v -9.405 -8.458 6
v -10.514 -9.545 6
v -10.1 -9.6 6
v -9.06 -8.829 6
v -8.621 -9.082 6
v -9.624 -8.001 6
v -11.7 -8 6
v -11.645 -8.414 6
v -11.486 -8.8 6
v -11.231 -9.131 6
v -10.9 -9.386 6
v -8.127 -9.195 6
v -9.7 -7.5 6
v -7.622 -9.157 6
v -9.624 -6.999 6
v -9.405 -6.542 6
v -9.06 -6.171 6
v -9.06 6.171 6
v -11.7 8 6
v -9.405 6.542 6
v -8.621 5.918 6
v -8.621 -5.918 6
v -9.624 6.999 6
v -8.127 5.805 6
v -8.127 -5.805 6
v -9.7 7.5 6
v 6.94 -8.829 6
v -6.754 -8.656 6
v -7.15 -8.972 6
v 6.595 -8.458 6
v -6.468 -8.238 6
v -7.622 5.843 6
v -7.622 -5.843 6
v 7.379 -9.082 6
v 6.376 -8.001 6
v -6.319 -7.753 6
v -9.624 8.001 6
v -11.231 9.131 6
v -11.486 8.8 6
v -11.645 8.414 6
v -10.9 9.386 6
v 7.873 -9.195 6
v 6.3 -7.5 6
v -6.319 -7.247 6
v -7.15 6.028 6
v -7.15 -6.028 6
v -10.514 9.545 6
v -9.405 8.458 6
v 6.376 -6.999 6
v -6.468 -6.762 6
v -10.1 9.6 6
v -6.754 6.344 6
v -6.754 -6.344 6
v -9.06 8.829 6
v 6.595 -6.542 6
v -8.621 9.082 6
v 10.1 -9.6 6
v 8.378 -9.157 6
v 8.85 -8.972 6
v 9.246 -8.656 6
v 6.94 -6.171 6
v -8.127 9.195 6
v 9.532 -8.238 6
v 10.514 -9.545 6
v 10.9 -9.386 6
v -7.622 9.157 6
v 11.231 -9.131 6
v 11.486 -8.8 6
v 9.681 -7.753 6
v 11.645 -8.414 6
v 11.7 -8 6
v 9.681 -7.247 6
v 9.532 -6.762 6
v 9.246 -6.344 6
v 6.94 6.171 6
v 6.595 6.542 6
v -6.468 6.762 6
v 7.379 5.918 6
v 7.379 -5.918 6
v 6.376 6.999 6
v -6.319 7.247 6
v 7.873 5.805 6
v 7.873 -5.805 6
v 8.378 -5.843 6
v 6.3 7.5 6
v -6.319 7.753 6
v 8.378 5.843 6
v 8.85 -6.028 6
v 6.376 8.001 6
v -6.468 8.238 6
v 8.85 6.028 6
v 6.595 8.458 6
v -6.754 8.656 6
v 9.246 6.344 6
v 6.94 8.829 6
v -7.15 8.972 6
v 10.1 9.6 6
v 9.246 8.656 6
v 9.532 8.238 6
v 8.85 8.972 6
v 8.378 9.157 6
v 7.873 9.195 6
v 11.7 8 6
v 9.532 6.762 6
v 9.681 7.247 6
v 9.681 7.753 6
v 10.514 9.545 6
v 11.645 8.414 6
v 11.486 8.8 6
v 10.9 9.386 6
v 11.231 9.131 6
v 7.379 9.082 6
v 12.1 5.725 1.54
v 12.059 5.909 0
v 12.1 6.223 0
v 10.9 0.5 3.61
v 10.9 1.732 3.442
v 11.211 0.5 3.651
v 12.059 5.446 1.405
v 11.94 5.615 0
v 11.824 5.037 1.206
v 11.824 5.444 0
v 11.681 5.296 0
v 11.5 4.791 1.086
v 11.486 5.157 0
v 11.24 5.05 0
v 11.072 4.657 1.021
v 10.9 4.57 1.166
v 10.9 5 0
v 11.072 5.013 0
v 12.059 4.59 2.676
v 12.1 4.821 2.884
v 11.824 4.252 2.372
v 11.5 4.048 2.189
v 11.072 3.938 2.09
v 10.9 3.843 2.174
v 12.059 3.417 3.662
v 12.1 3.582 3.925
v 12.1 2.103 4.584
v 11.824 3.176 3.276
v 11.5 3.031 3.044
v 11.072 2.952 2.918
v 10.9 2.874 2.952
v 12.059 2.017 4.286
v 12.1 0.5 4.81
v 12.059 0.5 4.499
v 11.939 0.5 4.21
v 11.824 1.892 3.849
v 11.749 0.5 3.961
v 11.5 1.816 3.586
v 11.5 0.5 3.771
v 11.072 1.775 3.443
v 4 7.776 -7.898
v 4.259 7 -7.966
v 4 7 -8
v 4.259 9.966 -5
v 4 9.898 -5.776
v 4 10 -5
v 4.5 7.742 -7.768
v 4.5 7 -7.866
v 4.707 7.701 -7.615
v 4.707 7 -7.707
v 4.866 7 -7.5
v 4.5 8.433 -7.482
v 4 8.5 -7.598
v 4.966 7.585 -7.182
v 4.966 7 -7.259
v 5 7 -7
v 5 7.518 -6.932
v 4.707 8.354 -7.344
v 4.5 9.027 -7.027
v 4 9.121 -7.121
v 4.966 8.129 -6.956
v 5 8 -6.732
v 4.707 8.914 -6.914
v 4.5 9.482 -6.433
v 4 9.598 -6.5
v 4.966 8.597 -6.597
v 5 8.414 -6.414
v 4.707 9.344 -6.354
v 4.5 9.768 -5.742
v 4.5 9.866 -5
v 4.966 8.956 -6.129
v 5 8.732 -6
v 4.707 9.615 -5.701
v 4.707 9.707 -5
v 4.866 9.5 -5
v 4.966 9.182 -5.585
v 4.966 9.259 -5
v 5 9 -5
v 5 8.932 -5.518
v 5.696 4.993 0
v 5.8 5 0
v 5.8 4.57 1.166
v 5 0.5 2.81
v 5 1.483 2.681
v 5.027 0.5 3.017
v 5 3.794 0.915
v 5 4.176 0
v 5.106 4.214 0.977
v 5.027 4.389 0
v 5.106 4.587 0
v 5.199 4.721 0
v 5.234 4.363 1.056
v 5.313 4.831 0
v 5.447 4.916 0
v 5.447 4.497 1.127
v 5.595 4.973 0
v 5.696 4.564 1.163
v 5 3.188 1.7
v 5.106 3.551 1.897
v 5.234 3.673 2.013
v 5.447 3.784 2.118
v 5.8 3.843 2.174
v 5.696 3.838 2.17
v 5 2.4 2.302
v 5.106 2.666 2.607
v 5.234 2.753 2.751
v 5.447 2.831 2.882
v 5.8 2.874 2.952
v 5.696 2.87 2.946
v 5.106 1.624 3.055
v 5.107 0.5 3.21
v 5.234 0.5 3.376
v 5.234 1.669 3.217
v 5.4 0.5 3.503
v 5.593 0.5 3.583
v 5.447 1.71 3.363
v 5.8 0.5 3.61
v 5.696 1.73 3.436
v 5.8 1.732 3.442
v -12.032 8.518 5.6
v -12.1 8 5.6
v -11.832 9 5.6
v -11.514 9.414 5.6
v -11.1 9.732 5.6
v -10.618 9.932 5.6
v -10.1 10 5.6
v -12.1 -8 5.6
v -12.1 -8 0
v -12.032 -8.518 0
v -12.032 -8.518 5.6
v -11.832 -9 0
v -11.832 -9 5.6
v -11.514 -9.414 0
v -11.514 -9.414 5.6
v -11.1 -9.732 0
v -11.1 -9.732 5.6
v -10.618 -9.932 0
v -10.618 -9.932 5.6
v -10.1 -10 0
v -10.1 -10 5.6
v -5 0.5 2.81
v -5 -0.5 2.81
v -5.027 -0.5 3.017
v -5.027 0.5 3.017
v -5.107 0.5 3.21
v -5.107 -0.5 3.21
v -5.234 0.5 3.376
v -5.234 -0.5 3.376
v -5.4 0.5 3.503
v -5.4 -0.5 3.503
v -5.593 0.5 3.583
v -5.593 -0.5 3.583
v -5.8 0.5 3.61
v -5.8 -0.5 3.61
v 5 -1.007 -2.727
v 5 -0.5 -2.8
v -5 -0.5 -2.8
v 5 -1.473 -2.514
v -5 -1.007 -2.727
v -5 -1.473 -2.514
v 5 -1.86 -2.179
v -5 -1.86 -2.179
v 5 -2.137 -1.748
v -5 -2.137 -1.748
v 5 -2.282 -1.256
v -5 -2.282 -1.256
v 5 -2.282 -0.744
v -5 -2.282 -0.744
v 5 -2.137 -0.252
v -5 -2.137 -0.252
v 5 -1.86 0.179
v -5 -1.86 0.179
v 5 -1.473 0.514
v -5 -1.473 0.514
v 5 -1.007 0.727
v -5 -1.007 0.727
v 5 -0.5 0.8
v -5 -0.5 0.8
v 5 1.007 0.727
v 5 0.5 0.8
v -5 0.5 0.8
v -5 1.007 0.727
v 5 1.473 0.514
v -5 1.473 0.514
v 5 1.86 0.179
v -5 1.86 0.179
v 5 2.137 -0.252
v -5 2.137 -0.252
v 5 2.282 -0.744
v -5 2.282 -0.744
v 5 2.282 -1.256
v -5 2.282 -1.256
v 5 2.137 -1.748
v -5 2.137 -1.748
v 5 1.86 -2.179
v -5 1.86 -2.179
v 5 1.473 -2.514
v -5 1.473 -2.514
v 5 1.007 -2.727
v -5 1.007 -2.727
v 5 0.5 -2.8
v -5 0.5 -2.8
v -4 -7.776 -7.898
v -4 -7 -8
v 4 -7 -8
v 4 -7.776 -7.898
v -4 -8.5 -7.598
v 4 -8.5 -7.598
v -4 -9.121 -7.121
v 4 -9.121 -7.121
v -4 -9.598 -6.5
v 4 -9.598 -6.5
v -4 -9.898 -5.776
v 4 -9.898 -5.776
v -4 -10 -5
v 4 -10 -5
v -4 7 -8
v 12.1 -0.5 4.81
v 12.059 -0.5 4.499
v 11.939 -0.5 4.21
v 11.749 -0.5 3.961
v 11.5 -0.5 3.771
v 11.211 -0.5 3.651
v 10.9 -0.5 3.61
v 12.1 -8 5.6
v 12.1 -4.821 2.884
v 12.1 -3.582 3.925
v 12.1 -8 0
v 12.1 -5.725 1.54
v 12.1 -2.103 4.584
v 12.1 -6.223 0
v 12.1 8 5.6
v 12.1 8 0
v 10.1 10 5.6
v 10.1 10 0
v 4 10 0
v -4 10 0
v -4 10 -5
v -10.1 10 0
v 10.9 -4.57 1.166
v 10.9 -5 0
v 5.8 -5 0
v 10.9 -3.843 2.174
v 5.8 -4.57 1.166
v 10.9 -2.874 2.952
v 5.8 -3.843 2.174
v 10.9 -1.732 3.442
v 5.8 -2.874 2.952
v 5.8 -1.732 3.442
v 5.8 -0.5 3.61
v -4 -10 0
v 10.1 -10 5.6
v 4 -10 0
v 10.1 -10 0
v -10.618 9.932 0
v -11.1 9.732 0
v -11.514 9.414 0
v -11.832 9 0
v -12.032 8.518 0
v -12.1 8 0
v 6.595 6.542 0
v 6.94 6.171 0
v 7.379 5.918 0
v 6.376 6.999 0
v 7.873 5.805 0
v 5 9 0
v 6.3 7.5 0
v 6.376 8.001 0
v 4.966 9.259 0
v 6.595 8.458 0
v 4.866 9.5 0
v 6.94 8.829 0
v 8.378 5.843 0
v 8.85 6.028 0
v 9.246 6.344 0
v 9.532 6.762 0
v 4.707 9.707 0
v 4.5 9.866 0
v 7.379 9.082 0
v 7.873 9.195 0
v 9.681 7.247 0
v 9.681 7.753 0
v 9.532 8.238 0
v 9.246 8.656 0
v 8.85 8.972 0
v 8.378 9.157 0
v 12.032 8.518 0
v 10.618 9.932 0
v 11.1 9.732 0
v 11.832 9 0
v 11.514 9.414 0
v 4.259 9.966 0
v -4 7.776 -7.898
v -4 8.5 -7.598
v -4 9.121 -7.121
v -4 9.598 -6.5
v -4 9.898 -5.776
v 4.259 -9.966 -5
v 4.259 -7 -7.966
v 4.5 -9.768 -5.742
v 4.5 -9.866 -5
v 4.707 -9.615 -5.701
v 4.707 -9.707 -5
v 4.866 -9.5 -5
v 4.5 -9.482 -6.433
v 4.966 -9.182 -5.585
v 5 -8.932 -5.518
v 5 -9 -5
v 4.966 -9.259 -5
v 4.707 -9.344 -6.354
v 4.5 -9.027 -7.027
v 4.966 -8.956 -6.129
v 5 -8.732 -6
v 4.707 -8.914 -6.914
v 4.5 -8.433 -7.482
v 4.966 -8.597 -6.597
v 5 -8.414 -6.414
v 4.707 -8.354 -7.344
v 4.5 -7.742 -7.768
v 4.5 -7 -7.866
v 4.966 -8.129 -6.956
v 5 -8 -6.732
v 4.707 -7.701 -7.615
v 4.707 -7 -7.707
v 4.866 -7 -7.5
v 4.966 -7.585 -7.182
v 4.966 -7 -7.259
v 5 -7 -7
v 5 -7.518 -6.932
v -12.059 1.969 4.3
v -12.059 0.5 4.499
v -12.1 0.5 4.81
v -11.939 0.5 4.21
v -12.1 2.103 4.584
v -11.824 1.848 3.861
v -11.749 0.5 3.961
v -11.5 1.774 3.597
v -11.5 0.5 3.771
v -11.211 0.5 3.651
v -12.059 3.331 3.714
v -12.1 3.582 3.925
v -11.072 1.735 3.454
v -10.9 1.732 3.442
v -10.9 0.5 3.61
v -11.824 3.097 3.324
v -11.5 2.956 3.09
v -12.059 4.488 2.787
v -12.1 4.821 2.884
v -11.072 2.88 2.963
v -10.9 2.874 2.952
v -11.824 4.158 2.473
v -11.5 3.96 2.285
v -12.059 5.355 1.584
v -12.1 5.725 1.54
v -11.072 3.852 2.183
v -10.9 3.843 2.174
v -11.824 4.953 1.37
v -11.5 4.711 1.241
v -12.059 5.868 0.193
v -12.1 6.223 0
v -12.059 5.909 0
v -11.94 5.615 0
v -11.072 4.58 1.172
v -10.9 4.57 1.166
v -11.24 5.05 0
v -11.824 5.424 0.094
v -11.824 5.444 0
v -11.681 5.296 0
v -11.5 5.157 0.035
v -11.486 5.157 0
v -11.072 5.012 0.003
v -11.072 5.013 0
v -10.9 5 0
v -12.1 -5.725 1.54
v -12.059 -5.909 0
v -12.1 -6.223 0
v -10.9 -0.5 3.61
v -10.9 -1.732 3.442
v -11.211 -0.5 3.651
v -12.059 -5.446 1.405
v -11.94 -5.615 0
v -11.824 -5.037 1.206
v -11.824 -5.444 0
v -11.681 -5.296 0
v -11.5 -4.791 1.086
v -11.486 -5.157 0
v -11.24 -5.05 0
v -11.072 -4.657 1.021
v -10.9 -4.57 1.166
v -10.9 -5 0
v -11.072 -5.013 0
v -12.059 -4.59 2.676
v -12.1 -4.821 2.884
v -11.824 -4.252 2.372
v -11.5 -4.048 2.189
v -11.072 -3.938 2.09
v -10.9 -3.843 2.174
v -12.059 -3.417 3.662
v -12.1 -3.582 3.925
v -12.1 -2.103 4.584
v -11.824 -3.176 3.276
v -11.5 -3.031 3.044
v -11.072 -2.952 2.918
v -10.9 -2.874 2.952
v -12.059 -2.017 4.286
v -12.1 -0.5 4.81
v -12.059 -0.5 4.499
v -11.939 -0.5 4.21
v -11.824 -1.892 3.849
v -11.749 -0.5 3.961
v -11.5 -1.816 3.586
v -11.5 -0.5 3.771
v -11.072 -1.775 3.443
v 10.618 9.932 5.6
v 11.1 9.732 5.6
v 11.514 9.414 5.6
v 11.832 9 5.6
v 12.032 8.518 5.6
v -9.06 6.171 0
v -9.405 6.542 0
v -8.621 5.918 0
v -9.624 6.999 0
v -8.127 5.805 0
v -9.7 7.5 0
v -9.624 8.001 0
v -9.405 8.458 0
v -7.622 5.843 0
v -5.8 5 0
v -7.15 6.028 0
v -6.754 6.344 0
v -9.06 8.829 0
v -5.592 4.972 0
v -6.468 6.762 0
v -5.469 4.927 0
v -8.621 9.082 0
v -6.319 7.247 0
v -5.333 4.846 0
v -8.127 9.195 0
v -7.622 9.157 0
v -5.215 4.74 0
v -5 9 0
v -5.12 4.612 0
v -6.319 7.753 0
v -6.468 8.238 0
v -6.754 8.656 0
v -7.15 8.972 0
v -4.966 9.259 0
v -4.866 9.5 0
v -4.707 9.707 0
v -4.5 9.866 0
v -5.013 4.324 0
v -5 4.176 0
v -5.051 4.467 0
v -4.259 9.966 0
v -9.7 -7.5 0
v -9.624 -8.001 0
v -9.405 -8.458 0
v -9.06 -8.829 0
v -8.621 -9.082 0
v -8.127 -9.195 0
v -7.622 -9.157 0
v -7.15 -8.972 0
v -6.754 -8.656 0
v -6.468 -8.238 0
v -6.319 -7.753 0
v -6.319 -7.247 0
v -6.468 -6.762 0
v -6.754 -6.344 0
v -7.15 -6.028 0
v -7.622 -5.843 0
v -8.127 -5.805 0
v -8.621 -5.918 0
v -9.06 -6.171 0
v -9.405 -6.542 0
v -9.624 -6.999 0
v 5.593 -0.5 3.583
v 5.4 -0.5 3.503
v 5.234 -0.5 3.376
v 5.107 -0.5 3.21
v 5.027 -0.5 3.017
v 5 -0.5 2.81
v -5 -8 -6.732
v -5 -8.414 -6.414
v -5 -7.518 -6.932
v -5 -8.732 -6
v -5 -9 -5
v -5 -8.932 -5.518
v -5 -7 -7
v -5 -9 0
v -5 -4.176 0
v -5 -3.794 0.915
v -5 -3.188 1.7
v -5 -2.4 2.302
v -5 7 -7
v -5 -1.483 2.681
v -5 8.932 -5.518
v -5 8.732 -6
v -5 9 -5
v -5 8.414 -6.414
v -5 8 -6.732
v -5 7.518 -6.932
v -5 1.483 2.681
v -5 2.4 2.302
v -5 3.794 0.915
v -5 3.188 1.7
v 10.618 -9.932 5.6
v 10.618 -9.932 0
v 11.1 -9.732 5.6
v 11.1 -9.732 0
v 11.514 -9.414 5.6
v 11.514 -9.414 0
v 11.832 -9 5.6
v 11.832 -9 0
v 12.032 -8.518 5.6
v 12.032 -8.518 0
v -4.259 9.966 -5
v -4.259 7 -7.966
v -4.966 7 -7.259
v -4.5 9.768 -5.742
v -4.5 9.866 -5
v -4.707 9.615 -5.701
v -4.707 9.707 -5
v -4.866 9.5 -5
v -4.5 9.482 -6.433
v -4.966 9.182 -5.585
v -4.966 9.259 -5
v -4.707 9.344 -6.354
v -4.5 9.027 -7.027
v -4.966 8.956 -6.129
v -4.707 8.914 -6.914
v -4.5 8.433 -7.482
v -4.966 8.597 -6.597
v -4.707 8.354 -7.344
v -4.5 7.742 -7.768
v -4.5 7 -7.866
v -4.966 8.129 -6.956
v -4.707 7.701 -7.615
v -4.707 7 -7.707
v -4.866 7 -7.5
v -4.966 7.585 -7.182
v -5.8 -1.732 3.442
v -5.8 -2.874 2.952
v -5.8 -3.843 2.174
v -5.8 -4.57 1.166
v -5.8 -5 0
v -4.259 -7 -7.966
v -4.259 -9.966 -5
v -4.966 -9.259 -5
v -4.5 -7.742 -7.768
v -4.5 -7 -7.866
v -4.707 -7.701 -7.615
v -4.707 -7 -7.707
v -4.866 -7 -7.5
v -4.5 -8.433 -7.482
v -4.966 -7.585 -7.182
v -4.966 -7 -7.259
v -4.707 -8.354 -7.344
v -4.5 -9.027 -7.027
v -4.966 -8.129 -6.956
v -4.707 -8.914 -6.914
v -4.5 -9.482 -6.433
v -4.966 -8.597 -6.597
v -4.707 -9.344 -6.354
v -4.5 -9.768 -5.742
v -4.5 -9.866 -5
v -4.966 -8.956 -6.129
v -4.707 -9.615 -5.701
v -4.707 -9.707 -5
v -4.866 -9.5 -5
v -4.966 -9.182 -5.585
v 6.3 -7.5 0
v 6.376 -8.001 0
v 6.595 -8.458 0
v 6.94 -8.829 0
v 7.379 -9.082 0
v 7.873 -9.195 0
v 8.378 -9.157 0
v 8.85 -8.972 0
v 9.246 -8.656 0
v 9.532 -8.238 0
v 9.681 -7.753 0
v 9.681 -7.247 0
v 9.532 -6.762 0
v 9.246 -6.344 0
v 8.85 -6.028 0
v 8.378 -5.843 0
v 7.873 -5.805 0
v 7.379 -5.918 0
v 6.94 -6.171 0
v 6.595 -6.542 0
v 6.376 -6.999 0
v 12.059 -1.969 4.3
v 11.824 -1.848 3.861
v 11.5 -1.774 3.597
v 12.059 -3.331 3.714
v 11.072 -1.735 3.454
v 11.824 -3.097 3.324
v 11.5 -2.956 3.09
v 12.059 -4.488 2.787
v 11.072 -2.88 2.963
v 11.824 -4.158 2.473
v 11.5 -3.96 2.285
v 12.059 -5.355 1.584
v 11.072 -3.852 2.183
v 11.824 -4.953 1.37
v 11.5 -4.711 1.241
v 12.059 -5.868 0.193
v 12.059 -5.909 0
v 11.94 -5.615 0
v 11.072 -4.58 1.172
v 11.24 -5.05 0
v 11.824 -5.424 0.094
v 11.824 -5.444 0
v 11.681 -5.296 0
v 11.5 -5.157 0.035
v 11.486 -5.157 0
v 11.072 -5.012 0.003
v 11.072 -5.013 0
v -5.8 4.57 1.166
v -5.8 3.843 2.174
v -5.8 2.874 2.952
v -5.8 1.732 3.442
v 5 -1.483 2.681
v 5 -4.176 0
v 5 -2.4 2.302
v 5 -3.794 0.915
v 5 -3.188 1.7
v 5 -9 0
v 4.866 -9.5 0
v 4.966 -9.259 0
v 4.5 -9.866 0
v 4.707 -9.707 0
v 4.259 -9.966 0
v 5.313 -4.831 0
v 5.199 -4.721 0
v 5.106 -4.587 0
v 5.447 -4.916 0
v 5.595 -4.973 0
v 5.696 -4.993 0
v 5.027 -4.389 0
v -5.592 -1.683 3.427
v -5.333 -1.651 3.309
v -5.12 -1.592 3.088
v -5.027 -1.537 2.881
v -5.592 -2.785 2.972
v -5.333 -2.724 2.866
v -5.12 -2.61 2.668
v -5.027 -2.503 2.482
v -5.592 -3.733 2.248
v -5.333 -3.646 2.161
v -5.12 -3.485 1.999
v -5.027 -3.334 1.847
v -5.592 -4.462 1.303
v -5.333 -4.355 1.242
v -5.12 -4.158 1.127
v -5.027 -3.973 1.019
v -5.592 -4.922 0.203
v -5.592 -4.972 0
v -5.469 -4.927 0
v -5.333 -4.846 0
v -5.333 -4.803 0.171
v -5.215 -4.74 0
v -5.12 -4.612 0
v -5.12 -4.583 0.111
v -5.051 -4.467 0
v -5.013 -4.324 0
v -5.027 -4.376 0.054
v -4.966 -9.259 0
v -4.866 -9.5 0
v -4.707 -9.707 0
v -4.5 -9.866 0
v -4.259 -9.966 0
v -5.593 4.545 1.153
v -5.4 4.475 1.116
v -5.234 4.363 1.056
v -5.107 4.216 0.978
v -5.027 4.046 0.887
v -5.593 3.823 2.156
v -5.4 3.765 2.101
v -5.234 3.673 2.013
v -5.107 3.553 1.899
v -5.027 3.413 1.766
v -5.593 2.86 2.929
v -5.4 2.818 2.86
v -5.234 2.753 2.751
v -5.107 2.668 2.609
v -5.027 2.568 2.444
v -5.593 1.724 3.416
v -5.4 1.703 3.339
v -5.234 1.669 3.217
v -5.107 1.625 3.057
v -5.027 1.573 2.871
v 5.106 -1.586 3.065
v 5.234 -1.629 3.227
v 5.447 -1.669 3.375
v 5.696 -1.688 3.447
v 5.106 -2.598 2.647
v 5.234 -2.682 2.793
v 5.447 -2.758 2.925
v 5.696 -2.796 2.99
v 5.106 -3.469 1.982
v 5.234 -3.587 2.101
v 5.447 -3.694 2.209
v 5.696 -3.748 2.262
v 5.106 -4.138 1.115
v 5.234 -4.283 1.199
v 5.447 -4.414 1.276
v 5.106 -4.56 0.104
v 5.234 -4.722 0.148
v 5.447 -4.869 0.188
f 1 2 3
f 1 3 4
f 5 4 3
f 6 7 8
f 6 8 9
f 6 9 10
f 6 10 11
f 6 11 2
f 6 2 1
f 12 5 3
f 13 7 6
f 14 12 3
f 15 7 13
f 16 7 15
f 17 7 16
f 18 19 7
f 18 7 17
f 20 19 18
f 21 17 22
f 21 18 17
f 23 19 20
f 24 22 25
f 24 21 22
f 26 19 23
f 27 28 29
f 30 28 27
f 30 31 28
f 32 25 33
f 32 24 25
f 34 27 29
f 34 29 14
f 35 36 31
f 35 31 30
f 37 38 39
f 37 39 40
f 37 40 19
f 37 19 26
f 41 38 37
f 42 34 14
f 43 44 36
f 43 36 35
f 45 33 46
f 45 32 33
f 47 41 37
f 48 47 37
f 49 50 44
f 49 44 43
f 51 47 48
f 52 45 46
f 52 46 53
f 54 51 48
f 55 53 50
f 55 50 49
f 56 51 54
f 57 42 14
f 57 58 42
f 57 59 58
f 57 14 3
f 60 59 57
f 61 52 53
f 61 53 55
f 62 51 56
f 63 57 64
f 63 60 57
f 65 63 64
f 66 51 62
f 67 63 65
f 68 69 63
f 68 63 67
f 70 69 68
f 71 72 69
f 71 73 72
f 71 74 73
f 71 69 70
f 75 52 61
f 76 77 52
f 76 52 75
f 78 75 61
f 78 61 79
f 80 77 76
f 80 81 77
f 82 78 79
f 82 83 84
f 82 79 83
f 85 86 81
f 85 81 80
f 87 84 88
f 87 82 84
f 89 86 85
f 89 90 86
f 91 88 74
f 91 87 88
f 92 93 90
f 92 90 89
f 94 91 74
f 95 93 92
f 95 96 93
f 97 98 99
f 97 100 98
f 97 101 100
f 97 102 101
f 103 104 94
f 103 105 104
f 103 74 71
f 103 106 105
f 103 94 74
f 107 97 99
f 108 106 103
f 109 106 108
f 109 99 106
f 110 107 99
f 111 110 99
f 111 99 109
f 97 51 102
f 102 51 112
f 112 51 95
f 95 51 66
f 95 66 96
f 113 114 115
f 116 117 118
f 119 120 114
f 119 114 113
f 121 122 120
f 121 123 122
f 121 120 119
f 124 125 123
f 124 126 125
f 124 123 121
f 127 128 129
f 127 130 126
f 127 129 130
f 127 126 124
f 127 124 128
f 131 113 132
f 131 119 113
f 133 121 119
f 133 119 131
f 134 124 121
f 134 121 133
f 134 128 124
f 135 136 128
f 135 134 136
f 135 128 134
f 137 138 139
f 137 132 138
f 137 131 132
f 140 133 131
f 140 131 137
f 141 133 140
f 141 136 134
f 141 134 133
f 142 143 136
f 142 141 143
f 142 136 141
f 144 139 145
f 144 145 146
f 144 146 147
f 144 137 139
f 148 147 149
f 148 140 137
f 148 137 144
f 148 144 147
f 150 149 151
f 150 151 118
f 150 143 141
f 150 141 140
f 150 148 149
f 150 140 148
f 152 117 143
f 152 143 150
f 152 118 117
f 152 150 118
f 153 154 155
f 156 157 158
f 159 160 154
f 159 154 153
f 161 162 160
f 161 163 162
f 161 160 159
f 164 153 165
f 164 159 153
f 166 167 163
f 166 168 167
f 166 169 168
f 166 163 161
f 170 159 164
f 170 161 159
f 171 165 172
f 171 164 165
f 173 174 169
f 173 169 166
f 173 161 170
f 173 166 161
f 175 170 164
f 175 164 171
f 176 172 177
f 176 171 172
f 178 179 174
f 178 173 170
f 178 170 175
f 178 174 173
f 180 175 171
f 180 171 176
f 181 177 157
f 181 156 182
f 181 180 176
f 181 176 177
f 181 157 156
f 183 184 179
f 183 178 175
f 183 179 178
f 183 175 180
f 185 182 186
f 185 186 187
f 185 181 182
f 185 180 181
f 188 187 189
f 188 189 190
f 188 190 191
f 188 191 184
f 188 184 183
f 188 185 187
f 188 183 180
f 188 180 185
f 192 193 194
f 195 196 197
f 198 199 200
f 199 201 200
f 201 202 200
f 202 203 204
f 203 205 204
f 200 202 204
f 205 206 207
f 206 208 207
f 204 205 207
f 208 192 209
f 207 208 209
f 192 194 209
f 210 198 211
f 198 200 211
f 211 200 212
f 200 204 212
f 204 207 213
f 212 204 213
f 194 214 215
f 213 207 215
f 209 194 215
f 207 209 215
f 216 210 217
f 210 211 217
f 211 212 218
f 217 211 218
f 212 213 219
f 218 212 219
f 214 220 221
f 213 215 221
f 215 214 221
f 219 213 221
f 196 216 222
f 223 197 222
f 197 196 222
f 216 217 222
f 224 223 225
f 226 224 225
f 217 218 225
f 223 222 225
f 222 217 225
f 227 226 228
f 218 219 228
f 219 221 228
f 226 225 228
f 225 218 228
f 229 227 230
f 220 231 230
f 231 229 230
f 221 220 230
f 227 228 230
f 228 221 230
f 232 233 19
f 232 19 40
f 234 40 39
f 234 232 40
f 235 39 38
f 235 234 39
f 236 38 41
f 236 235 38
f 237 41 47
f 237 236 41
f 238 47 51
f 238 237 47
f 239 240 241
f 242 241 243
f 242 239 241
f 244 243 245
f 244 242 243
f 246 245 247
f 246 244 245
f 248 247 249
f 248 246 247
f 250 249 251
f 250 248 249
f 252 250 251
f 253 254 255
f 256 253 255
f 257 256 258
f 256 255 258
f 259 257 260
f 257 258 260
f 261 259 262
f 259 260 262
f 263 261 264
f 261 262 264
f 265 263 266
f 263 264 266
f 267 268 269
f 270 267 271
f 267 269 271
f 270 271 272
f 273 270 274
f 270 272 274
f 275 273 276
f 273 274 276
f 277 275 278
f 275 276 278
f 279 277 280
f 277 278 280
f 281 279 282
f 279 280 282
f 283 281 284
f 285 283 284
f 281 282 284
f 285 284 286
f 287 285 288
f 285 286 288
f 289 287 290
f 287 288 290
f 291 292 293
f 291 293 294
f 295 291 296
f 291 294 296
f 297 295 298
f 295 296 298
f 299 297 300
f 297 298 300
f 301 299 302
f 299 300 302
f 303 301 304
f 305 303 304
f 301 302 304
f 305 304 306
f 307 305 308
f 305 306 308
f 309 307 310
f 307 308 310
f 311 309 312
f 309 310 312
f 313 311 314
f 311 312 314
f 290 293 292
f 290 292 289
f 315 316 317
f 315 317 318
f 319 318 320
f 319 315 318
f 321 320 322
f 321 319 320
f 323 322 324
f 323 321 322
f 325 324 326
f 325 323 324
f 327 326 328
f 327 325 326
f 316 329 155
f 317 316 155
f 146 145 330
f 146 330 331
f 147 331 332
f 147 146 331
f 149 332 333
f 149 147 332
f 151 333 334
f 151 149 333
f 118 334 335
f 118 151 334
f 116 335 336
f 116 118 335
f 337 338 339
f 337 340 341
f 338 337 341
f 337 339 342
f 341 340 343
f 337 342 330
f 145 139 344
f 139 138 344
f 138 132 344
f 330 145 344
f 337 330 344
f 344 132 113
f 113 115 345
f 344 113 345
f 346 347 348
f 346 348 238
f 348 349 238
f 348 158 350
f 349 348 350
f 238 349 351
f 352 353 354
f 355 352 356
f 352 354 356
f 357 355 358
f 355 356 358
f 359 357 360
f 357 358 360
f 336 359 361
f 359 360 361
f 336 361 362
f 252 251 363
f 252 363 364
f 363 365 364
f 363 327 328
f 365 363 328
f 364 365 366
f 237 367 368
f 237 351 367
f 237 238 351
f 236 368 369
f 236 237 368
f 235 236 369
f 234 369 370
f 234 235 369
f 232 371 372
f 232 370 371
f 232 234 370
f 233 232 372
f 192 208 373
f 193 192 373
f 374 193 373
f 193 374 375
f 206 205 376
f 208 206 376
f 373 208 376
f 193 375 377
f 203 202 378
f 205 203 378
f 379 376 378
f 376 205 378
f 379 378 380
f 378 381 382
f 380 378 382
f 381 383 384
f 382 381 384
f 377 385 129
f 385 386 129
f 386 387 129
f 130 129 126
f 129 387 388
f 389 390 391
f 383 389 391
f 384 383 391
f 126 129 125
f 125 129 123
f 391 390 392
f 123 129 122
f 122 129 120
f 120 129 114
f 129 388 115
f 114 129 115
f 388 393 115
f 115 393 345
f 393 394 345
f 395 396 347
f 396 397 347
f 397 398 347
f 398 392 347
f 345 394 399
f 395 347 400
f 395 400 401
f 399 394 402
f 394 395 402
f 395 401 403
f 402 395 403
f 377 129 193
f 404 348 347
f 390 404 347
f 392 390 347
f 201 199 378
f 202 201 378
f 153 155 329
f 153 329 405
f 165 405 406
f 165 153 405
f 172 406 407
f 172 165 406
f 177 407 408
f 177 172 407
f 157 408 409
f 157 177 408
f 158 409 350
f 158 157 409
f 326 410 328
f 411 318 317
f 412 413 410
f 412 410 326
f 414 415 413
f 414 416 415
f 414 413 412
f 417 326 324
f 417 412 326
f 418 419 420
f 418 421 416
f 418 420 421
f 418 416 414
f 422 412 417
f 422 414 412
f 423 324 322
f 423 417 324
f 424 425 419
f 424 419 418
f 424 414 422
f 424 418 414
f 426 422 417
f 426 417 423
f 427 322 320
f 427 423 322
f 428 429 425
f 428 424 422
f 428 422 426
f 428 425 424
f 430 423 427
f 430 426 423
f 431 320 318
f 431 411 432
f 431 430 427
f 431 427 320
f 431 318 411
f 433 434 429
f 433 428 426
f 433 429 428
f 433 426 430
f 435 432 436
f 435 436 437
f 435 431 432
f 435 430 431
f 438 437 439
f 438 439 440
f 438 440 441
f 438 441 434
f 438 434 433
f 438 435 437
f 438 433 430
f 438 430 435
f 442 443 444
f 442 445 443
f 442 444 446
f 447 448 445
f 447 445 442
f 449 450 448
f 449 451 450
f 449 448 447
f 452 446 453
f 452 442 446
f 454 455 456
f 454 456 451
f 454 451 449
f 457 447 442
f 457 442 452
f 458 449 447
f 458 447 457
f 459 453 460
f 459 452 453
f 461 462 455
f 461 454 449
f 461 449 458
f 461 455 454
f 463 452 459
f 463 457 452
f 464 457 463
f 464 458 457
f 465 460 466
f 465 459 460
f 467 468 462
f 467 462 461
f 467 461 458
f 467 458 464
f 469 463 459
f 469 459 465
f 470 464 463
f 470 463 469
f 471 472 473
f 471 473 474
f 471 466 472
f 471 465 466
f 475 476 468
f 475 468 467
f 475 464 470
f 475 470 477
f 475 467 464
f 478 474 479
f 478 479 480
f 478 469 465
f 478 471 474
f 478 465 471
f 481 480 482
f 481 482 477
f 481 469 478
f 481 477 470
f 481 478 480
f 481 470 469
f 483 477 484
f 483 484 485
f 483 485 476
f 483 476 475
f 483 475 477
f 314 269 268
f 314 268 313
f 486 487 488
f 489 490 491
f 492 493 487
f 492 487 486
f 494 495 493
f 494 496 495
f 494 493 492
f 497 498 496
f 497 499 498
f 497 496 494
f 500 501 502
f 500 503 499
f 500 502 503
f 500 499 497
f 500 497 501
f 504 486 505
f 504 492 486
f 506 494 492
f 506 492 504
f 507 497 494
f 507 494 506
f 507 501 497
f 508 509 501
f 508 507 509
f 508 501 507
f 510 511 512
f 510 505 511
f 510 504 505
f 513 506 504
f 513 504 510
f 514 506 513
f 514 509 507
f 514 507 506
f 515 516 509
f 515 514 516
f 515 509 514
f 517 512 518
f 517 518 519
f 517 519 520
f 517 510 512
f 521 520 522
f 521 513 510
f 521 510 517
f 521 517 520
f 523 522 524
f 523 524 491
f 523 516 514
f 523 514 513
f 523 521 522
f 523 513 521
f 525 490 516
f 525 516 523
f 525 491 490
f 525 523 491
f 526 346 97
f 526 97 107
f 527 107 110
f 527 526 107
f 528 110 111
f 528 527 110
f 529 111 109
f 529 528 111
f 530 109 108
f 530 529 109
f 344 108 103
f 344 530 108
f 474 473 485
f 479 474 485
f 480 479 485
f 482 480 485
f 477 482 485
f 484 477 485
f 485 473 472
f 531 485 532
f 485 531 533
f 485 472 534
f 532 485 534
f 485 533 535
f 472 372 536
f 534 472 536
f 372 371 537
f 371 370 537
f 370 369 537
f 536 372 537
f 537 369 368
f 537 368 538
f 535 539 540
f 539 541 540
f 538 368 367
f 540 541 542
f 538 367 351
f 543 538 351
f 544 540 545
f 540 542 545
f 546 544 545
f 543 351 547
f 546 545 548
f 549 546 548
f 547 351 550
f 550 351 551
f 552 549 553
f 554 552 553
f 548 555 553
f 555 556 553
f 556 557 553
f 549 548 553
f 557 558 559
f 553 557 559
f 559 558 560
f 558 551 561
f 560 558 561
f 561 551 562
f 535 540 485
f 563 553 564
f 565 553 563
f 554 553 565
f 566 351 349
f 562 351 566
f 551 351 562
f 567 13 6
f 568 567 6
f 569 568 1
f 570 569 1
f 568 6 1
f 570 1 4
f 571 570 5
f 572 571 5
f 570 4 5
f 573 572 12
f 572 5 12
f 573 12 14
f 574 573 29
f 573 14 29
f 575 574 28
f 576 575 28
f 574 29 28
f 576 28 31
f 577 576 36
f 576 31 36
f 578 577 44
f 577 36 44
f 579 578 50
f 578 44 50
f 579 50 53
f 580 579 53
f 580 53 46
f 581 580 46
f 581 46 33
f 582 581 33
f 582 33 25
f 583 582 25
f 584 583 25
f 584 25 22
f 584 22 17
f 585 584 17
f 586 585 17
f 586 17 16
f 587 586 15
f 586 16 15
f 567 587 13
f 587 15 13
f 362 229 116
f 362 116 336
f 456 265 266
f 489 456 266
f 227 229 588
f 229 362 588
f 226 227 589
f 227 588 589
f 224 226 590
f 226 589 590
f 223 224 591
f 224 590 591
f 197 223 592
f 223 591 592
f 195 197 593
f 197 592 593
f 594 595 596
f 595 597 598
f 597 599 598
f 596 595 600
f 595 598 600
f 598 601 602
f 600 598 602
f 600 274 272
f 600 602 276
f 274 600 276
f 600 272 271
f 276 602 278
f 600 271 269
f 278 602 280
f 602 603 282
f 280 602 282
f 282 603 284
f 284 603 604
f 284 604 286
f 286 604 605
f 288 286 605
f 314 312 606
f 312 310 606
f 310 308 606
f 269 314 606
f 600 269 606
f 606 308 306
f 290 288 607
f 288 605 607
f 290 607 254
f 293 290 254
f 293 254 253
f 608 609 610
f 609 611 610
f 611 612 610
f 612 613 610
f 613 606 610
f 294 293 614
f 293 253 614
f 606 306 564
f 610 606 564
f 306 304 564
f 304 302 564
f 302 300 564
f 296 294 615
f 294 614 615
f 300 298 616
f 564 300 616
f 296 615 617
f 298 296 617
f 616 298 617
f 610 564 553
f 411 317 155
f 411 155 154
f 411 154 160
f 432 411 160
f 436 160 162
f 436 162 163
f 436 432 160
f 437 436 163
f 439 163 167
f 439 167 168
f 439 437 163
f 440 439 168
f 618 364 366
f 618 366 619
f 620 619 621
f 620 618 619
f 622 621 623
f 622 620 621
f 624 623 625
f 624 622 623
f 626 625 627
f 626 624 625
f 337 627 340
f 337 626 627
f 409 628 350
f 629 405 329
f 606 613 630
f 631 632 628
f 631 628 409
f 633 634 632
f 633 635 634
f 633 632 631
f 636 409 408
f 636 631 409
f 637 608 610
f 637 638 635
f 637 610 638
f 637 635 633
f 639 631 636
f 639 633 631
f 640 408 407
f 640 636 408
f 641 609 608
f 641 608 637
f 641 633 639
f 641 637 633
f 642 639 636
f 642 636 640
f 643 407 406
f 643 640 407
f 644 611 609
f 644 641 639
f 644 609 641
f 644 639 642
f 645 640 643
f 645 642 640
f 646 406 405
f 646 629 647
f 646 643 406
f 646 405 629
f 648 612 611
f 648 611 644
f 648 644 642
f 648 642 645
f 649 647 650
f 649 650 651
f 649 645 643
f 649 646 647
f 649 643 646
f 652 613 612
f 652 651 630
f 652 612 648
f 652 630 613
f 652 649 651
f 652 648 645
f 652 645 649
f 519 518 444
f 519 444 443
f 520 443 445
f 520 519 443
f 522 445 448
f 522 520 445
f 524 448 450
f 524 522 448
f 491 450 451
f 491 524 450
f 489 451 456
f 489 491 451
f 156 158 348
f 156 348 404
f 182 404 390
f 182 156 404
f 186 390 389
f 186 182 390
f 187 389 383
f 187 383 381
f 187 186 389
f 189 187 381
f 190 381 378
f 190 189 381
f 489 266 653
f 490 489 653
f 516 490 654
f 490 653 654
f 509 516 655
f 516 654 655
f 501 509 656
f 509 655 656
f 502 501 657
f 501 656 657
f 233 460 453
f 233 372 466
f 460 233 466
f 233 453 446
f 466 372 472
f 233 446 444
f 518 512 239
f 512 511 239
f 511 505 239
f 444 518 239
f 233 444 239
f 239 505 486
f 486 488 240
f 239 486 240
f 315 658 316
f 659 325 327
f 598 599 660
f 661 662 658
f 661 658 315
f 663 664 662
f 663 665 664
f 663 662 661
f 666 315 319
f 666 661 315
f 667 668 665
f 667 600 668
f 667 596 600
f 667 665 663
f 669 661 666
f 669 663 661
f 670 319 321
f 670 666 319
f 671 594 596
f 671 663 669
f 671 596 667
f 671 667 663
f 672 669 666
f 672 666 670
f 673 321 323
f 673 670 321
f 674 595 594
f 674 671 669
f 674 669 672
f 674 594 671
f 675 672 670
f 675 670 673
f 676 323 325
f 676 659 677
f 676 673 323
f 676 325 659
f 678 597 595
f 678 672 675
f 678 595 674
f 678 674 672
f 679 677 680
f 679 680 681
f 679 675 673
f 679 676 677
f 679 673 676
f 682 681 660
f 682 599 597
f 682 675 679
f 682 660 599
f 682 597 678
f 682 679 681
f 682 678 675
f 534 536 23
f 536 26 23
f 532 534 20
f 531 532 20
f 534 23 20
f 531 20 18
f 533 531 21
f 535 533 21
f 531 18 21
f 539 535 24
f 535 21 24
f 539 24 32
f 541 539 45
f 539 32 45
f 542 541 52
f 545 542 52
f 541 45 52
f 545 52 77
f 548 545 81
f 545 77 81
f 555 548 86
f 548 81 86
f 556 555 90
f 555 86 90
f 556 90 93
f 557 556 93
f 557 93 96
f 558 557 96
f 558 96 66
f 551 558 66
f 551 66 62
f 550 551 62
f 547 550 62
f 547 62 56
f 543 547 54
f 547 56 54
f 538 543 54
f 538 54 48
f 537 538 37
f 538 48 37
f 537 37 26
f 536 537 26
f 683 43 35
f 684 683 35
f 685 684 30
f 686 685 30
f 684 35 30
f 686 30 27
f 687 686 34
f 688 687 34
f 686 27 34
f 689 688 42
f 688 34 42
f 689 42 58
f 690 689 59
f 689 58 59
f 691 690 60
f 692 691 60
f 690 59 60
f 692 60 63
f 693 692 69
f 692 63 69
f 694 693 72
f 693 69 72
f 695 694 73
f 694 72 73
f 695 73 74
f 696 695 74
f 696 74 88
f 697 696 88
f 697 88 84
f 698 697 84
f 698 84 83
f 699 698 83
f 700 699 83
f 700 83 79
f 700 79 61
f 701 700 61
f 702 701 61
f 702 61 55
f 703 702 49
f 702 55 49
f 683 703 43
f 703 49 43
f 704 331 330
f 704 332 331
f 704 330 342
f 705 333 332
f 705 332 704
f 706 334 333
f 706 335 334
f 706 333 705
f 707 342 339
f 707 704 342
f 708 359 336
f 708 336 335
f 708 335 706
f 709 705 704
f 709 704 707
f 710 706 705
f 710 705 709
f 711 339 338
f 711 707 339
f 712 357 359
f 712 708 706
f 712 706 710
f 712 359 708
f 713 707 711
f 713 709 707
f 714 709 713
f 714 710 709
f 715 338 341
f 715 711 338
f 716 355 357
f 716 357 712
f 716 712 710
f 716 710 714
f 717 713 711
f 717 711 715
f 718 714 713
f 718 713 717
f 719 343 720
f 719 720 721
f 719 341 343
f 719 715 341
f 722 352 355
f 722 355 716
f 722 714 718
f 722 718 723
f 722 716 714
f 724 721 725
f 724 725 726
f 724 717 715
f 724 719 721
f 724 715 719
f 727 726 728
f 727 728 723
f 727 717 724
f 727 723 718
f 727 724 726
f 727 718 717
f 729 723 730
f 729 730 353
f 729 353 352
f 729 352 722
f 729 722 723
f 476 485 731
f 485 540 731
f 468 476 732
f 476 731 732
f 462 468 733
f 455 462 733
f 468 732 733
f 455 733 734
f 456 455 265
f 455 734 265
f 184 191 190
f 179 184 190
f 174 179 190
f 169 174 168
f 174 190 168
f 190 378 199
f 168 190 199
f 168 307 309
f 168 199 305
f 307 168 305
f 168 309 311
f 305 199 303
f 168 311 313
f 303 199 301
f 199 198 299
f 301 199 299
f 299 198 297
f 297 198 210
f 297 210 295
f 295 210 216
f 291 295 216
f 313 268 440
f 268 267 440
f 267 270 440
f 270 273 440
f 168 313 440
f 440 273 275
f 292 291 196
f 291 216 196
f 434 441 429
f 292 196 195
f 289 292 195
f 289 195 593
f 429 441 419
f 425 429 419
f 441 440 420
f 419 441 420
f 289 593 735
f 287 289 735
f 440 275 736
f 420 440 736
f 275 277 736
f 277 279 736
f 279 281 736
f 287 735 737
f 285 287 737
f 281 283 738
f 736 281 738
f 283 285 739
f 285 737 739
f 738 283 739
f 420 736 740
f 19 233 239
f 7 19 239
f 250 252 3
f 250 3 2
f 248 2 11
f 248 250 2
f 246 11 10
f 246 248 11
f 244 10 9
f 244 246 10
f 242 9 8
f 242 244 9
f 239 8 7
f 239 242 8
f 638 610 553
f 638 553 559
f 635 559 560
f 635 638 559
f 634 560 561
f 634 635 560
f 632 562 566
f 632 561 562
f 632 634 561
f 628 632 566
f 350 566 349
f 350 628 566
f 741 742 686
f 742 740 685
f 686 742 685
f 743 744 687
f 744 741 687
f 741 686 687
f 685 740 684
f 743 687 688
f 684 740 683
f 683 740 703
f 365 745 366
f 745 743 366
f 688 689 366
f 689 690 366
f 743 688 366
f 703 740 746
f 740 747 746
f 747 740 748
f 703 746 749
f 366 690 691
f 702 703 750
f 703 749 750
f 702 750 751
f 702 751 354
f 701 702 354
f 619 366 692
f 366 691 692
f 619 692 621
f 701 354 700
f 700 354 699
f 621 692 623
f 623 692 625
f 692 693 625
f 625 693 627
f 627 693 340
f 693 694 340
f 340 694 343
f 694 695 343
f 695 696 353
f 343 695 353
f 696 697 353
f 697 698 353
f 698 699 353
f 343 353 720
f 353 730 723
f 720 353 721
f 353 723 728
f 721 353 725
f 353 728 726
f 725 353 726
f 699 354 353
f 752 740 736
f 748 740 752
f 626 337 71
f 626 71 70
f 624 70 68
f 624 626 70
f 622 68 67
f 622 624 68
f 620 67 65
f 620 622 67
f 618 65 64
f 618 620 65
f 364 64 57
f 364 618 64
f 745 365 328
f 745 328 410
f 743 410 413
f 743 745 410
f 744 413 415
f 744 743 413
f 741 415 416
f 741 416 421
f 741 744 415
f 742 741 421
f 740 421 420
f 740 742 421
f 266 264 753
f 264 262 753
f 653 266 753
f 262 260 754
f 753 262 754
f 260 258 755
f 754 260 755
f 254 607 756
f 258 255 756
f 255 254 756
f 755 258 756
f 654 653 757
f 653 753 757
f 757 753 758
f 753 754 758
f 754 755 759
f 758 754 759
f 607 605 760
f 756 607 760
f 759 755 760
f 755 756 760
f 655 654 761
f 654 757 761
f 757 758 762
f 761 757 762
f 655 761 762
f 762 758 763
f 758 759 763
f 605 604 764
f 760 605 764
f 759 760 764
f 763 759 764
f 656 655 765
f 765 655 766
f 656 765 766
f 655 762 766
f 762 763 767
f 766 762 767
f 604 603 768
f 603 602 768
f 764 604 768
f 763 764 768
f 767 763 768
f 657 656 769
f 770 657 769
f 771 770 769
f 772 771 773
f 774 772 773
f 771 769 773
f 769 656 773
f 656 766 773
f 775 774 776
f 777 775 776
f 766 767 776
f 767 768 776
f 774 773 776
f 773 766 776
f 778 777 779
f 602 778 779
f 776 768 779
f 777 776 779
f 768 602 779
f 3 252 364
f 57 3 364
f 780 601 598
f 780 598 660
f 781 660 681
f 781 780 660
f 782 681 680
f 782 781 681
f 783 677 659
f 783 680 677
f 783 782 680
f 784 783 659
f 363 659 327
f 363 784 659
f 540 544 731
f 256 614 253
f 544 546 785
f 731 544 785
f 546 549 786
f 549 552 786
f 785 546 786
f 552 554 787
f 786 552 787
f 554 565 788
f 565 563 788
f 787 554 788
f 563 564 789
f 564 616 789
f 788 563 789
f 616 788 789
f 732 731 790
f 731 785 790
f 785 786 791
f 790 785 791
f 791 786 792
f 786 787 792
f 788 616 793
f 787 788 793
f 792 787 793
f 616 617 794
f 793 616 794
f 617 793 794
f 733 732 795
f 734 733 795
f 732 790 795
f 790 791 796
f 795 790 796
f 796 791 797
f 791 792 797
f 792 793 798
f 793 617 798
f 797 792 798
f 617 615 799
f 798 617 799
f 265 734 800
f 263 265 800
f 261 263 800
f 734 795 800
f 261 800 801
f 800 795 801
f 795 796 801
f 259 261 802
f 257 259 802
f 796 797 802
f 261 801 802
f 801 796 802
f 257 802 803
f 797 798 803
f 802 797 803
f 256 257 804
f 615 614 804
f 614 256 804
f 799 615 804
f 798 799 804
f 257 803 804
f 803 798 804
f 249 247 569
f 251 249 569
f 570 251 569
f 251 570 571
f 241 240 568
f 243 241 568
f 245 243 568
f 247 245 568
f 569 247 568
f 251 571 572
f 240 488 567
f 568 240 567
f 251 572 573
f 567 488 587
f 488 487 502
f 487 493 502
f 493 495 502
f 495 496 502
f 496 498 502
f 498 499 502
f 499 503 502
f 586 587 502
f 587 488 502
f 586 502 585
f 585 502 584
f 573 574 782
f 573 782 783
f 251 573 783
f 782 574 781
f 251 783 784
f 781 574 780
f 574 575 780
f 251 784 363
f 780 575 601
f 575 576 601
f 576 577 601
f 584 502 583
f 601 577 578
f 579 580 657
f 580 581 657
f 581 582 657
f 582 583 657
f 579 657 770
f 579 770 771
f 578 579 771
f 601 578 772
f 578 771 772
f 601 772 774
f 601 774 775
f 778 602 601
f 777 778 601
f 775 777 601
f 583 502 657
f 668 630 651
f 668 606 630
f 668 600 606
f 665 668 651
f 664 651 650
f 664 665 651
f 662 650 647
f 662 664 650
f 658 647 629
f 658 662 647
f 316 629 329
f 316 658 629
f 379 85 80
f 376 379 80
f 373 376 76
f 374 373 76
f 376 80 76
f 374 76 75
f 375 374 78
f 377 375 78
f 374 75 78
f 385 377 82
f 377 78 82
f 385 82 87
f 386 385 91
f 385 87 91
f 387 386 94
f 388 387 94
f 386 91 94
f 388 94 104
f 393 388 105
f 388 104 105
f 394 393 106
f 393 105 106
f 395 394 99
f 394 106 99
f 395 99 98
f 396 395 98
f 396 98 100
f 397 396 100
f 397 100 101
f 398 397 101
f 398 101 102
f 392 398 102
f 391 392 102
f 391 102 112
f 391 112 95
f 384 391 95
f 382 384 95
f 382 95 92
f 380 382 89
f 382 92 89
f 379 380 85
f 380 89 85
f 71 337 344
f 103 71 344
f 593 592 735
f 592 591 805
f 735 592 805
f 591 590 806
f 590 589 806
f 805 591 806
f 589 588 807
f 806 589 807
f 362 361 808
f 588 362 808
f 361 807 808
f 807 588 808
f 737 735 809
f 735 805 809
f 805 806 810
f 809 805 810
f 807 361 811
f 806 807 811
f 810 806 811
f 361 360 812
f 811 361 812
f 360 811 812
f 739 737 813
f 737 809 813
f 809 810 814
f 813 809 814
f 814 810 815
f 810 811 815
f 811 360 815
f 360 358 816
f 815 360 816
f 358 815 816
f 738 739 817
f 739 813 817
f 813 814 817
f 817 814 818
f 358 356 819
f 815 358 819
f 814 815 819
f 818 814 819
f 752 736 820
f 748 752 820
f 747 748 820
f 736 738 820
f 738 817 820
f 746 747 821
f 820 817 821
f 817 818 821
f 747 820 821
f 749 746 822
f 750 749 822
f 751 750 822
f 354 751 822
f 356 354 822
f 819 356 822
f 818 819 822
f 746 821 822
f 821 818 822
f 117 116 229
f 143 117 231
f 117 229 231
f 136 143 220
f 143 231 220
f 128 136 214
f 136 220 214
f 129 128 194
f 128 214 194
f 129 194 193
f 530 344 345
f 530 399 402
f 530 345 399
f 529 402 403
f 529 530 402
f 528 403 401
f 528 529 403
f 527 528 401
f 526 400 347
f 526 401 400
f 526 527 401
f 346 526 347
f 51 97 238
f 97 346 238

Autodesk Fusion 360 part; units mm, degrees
sketch "Sketch1" plane through (0, 0, 0) normal (0, 0, 1) x (1, 0, 0) in component "x_carriage_pivot_block"
  line L0 (12.1, 10) -> (-12.1, 10)
  line L1 (-12.1, 10) -> (-12.1, -10)
  line L2 (-12.1, -10) -> (12.1, -10)
  line L3 (12.1, -10) -> (12.1, 10)
  line L4 (12.1, 10) -> (-12.1, -10) construction
  line L5 (-12.1, 10) -> (12.1, -10) construction
  dimension "d1" = 24.2
  dimension "d2" = 20
extrude "Extrude1" add sketch "Sketch1" along normal blind 6 in component "x_carriage_pivot_block"
sketch "Sketch2" plane through (0, 0, 0) normal (0, 0, -1) x (1, 0, 0) in component "x_carriage_pivot_block"
  line L0 (12.1, -10) -> (12.1, 10)
  line L1 (12.1, 10) -> (-12.1, 10)
  line L2 (-12.1, 10) -> (-12.1, -10)
  line L3 (-12.1, -10) -> (12.1, -10)
  line L4 (5, 10) -> (-5, 10)
  line L5 (-5, 10) -> (-5, -10)
  line L6 (-5, -10) -> (5, -10)
  line L7 (5, -10) -> (5, 10)
  line L8 (5, 10) -> (-5, -10) construction
  line L9 (-5, 10) -> (5, -10) construction
  dimension "d5" = 10
  dimension "d6" = 20
extrude "Extrude2" add sketch "Sketch2" along normal blind 8 contours L1 L3 L4 L5 L6 L7 in component "x_carriage_pivot_block"
sketch "Sketch3" plane through (0, 0, 0) normal (1, 0, 0) x (0, 1, 0) in component "x_carriage_pivot_block"
  line L0 (10, 0) -> (10, 6) construction
  line L1 (10, 6) -> (-10, 6) construction
  line L2 (-10, 6) -> (-10, 0) construction
  line L3 (-10, 0) -> (-10, -8) construction
  line L4 (-10, -8) -> (10, -8) construction
  line L5 (10, -8) -> (10, 0) construction
  line L6 (-0.5, -2.8) -> (0.5, -2.8)
  arc A0 (0.5, -2.8) -> (0.5, 0.8) centre (0.5, -1) ccw
  line L7 (0.5, 0.8) -> (-0.5, 0.8)
  arc A1 (-0.5, 0.8) -> (-0.5, -2.8) centre (-0.5, -1) ccw
  line L8 (-0.5, -1) -> (0.5, -1) construction
  line L9 (0, 6) -> (0, -8) construction
  line L10 (-0.5, -5.61) -> (0.5, -5.61)
  arc A2 (0.5, -5.61) -> (0.5, 3.61) centre (0.5, -1) ccw
  line L11 (0.5, 3.61) -> (-0.5, 3.61)
  arc A3 (-0.5, 3.61) -> (-0.5, -5.61) centre (-0.5, -1) ccw
  line L12 (-0.5, -1) -> (0.5, -1) construction
  point P0 (0, -1)
  dimension "d9" = 3.6
  dimension "d11" = 1
  dimension "d12" = 9.22
extrude "Extrude3" cut sketch "Sketch3" along normal through all and the other way through all contours L6 A0 L7 A1 in component "x_carriage_pivot_block"
extrude "Extrude4" cut sketch "Sketch3" along normal through all from surface at 5 in component "x_carriage_pivot_block"
extrude "Extrude5" cut sketch "Sketch3" against normal through all from surface at -5 in component "x_carriage_pivot_block"
sketch "Sketch4" plane through (0, 0, 6) normal (0, 0, 1) x (-1, 0, 0) in component "x_carriage_pivot_block"
  line L0 (-12.1, 10) -> (-12.1, -10)
  line L1 (-12.1, -10) -> (12.1, -10)
  line L2 (12.1, -10) -> (12.1, 10)
  line L3 (12.1, 10) -> (-12.1, 10)
  circle A0 centre (8, -7.5) radius 1.7
  line L4 (0, 0) -> (0, -13) construction
  line L5 (0, 0) -> (-15, 0) construction
  circle A1 centre (-8, -7.5) radius 1.7
  circle A2 centre (8, 7.5) radius 1.7
  circle A3 centre (-8, 7.5) radius 1.7
  dimension "d19" = 3.4
  dimension "d20" = 16
  dimension "d21" = 15
extrude "Extrude6" cut sketch "Sketch4" against normal through all contours A0 | A1 | A2 | A3 in component "x_carriage_pivot_block"
fillet "Fillet1" radius 3 2 edges at (0, -10, -8) (0, 10, -8) in component "x_carriage_pivot_block"
fillet "Fillet2" radius 1 10 edges at (-5, 10, -2.5) (-5, 9.1213, -7.1213) (-5, 0, -8) (-5, -9.1213, -7.1213) (-5, -10, -2.5) (5, 10, -2.5) (5, 9.1213, -7.1213) (5, 0, -8) (5, -9.1213, -7.1213) (5, -10, -2.5) in component "x_carriage_pivot_block"
fillet "Fillet3" radius 1.2 6 edges at (-12.1, 3.3846, 2.596) (-12.1, 0, 3.61) (-12.1, -3.3846, 2.596) (12.1, -3.3846, 2.596) (12.1, 0, 3.61) (12.1, 3.3846, 2.596) in component "x_carriage_pivot_block"
fillet "Fillet4" radius 0.8 6 edges at (-5, 3.3846, 2.596) (-5, 0, 3.61) (-5, -3.3846, 2.596) (5, -3.3846, 2.596) (5, 0, 3.61) (5, 3.3846, 2.596) in component "x_carriage_pivot_block"
fillet "Fillet5" radius 2 4 edges at (-12.1, 10, 3) (-12.1, -10, 3) (12.1, -10, 3) (12.1, 10, 3) in component "x_carriage_pivot_block"
chamfer "Chamfer1" distance 0.4 angle 45 8 edges at (12.1, 0, 6) (11.5142, 9.4142, 6) (0, 10, 6) (-11.5142, 9.4142, 6) (-12.1, 0, 6) (-11.5142, -9.4142, 6) (0, -10, 6) (11.5142, -9.4142, 6) in component "x_carriage_pivot_block"
component "x_carriage_pivot_block" placed x (1, 0, 0) y (0, 1, 0) z (0, 0, 1) at (0, 0, 0)
equation "pivot_movement = 1 mm"
equation "d11 = pivot_movement"
equation "d12 = ( 4.61 * 2 ) * 1 mm"
equation "d19 = ( 1.7 * 2 ) * 1 mm"
equation "d33 = chamfer"
equation "chamfer = 0.4 mm"
